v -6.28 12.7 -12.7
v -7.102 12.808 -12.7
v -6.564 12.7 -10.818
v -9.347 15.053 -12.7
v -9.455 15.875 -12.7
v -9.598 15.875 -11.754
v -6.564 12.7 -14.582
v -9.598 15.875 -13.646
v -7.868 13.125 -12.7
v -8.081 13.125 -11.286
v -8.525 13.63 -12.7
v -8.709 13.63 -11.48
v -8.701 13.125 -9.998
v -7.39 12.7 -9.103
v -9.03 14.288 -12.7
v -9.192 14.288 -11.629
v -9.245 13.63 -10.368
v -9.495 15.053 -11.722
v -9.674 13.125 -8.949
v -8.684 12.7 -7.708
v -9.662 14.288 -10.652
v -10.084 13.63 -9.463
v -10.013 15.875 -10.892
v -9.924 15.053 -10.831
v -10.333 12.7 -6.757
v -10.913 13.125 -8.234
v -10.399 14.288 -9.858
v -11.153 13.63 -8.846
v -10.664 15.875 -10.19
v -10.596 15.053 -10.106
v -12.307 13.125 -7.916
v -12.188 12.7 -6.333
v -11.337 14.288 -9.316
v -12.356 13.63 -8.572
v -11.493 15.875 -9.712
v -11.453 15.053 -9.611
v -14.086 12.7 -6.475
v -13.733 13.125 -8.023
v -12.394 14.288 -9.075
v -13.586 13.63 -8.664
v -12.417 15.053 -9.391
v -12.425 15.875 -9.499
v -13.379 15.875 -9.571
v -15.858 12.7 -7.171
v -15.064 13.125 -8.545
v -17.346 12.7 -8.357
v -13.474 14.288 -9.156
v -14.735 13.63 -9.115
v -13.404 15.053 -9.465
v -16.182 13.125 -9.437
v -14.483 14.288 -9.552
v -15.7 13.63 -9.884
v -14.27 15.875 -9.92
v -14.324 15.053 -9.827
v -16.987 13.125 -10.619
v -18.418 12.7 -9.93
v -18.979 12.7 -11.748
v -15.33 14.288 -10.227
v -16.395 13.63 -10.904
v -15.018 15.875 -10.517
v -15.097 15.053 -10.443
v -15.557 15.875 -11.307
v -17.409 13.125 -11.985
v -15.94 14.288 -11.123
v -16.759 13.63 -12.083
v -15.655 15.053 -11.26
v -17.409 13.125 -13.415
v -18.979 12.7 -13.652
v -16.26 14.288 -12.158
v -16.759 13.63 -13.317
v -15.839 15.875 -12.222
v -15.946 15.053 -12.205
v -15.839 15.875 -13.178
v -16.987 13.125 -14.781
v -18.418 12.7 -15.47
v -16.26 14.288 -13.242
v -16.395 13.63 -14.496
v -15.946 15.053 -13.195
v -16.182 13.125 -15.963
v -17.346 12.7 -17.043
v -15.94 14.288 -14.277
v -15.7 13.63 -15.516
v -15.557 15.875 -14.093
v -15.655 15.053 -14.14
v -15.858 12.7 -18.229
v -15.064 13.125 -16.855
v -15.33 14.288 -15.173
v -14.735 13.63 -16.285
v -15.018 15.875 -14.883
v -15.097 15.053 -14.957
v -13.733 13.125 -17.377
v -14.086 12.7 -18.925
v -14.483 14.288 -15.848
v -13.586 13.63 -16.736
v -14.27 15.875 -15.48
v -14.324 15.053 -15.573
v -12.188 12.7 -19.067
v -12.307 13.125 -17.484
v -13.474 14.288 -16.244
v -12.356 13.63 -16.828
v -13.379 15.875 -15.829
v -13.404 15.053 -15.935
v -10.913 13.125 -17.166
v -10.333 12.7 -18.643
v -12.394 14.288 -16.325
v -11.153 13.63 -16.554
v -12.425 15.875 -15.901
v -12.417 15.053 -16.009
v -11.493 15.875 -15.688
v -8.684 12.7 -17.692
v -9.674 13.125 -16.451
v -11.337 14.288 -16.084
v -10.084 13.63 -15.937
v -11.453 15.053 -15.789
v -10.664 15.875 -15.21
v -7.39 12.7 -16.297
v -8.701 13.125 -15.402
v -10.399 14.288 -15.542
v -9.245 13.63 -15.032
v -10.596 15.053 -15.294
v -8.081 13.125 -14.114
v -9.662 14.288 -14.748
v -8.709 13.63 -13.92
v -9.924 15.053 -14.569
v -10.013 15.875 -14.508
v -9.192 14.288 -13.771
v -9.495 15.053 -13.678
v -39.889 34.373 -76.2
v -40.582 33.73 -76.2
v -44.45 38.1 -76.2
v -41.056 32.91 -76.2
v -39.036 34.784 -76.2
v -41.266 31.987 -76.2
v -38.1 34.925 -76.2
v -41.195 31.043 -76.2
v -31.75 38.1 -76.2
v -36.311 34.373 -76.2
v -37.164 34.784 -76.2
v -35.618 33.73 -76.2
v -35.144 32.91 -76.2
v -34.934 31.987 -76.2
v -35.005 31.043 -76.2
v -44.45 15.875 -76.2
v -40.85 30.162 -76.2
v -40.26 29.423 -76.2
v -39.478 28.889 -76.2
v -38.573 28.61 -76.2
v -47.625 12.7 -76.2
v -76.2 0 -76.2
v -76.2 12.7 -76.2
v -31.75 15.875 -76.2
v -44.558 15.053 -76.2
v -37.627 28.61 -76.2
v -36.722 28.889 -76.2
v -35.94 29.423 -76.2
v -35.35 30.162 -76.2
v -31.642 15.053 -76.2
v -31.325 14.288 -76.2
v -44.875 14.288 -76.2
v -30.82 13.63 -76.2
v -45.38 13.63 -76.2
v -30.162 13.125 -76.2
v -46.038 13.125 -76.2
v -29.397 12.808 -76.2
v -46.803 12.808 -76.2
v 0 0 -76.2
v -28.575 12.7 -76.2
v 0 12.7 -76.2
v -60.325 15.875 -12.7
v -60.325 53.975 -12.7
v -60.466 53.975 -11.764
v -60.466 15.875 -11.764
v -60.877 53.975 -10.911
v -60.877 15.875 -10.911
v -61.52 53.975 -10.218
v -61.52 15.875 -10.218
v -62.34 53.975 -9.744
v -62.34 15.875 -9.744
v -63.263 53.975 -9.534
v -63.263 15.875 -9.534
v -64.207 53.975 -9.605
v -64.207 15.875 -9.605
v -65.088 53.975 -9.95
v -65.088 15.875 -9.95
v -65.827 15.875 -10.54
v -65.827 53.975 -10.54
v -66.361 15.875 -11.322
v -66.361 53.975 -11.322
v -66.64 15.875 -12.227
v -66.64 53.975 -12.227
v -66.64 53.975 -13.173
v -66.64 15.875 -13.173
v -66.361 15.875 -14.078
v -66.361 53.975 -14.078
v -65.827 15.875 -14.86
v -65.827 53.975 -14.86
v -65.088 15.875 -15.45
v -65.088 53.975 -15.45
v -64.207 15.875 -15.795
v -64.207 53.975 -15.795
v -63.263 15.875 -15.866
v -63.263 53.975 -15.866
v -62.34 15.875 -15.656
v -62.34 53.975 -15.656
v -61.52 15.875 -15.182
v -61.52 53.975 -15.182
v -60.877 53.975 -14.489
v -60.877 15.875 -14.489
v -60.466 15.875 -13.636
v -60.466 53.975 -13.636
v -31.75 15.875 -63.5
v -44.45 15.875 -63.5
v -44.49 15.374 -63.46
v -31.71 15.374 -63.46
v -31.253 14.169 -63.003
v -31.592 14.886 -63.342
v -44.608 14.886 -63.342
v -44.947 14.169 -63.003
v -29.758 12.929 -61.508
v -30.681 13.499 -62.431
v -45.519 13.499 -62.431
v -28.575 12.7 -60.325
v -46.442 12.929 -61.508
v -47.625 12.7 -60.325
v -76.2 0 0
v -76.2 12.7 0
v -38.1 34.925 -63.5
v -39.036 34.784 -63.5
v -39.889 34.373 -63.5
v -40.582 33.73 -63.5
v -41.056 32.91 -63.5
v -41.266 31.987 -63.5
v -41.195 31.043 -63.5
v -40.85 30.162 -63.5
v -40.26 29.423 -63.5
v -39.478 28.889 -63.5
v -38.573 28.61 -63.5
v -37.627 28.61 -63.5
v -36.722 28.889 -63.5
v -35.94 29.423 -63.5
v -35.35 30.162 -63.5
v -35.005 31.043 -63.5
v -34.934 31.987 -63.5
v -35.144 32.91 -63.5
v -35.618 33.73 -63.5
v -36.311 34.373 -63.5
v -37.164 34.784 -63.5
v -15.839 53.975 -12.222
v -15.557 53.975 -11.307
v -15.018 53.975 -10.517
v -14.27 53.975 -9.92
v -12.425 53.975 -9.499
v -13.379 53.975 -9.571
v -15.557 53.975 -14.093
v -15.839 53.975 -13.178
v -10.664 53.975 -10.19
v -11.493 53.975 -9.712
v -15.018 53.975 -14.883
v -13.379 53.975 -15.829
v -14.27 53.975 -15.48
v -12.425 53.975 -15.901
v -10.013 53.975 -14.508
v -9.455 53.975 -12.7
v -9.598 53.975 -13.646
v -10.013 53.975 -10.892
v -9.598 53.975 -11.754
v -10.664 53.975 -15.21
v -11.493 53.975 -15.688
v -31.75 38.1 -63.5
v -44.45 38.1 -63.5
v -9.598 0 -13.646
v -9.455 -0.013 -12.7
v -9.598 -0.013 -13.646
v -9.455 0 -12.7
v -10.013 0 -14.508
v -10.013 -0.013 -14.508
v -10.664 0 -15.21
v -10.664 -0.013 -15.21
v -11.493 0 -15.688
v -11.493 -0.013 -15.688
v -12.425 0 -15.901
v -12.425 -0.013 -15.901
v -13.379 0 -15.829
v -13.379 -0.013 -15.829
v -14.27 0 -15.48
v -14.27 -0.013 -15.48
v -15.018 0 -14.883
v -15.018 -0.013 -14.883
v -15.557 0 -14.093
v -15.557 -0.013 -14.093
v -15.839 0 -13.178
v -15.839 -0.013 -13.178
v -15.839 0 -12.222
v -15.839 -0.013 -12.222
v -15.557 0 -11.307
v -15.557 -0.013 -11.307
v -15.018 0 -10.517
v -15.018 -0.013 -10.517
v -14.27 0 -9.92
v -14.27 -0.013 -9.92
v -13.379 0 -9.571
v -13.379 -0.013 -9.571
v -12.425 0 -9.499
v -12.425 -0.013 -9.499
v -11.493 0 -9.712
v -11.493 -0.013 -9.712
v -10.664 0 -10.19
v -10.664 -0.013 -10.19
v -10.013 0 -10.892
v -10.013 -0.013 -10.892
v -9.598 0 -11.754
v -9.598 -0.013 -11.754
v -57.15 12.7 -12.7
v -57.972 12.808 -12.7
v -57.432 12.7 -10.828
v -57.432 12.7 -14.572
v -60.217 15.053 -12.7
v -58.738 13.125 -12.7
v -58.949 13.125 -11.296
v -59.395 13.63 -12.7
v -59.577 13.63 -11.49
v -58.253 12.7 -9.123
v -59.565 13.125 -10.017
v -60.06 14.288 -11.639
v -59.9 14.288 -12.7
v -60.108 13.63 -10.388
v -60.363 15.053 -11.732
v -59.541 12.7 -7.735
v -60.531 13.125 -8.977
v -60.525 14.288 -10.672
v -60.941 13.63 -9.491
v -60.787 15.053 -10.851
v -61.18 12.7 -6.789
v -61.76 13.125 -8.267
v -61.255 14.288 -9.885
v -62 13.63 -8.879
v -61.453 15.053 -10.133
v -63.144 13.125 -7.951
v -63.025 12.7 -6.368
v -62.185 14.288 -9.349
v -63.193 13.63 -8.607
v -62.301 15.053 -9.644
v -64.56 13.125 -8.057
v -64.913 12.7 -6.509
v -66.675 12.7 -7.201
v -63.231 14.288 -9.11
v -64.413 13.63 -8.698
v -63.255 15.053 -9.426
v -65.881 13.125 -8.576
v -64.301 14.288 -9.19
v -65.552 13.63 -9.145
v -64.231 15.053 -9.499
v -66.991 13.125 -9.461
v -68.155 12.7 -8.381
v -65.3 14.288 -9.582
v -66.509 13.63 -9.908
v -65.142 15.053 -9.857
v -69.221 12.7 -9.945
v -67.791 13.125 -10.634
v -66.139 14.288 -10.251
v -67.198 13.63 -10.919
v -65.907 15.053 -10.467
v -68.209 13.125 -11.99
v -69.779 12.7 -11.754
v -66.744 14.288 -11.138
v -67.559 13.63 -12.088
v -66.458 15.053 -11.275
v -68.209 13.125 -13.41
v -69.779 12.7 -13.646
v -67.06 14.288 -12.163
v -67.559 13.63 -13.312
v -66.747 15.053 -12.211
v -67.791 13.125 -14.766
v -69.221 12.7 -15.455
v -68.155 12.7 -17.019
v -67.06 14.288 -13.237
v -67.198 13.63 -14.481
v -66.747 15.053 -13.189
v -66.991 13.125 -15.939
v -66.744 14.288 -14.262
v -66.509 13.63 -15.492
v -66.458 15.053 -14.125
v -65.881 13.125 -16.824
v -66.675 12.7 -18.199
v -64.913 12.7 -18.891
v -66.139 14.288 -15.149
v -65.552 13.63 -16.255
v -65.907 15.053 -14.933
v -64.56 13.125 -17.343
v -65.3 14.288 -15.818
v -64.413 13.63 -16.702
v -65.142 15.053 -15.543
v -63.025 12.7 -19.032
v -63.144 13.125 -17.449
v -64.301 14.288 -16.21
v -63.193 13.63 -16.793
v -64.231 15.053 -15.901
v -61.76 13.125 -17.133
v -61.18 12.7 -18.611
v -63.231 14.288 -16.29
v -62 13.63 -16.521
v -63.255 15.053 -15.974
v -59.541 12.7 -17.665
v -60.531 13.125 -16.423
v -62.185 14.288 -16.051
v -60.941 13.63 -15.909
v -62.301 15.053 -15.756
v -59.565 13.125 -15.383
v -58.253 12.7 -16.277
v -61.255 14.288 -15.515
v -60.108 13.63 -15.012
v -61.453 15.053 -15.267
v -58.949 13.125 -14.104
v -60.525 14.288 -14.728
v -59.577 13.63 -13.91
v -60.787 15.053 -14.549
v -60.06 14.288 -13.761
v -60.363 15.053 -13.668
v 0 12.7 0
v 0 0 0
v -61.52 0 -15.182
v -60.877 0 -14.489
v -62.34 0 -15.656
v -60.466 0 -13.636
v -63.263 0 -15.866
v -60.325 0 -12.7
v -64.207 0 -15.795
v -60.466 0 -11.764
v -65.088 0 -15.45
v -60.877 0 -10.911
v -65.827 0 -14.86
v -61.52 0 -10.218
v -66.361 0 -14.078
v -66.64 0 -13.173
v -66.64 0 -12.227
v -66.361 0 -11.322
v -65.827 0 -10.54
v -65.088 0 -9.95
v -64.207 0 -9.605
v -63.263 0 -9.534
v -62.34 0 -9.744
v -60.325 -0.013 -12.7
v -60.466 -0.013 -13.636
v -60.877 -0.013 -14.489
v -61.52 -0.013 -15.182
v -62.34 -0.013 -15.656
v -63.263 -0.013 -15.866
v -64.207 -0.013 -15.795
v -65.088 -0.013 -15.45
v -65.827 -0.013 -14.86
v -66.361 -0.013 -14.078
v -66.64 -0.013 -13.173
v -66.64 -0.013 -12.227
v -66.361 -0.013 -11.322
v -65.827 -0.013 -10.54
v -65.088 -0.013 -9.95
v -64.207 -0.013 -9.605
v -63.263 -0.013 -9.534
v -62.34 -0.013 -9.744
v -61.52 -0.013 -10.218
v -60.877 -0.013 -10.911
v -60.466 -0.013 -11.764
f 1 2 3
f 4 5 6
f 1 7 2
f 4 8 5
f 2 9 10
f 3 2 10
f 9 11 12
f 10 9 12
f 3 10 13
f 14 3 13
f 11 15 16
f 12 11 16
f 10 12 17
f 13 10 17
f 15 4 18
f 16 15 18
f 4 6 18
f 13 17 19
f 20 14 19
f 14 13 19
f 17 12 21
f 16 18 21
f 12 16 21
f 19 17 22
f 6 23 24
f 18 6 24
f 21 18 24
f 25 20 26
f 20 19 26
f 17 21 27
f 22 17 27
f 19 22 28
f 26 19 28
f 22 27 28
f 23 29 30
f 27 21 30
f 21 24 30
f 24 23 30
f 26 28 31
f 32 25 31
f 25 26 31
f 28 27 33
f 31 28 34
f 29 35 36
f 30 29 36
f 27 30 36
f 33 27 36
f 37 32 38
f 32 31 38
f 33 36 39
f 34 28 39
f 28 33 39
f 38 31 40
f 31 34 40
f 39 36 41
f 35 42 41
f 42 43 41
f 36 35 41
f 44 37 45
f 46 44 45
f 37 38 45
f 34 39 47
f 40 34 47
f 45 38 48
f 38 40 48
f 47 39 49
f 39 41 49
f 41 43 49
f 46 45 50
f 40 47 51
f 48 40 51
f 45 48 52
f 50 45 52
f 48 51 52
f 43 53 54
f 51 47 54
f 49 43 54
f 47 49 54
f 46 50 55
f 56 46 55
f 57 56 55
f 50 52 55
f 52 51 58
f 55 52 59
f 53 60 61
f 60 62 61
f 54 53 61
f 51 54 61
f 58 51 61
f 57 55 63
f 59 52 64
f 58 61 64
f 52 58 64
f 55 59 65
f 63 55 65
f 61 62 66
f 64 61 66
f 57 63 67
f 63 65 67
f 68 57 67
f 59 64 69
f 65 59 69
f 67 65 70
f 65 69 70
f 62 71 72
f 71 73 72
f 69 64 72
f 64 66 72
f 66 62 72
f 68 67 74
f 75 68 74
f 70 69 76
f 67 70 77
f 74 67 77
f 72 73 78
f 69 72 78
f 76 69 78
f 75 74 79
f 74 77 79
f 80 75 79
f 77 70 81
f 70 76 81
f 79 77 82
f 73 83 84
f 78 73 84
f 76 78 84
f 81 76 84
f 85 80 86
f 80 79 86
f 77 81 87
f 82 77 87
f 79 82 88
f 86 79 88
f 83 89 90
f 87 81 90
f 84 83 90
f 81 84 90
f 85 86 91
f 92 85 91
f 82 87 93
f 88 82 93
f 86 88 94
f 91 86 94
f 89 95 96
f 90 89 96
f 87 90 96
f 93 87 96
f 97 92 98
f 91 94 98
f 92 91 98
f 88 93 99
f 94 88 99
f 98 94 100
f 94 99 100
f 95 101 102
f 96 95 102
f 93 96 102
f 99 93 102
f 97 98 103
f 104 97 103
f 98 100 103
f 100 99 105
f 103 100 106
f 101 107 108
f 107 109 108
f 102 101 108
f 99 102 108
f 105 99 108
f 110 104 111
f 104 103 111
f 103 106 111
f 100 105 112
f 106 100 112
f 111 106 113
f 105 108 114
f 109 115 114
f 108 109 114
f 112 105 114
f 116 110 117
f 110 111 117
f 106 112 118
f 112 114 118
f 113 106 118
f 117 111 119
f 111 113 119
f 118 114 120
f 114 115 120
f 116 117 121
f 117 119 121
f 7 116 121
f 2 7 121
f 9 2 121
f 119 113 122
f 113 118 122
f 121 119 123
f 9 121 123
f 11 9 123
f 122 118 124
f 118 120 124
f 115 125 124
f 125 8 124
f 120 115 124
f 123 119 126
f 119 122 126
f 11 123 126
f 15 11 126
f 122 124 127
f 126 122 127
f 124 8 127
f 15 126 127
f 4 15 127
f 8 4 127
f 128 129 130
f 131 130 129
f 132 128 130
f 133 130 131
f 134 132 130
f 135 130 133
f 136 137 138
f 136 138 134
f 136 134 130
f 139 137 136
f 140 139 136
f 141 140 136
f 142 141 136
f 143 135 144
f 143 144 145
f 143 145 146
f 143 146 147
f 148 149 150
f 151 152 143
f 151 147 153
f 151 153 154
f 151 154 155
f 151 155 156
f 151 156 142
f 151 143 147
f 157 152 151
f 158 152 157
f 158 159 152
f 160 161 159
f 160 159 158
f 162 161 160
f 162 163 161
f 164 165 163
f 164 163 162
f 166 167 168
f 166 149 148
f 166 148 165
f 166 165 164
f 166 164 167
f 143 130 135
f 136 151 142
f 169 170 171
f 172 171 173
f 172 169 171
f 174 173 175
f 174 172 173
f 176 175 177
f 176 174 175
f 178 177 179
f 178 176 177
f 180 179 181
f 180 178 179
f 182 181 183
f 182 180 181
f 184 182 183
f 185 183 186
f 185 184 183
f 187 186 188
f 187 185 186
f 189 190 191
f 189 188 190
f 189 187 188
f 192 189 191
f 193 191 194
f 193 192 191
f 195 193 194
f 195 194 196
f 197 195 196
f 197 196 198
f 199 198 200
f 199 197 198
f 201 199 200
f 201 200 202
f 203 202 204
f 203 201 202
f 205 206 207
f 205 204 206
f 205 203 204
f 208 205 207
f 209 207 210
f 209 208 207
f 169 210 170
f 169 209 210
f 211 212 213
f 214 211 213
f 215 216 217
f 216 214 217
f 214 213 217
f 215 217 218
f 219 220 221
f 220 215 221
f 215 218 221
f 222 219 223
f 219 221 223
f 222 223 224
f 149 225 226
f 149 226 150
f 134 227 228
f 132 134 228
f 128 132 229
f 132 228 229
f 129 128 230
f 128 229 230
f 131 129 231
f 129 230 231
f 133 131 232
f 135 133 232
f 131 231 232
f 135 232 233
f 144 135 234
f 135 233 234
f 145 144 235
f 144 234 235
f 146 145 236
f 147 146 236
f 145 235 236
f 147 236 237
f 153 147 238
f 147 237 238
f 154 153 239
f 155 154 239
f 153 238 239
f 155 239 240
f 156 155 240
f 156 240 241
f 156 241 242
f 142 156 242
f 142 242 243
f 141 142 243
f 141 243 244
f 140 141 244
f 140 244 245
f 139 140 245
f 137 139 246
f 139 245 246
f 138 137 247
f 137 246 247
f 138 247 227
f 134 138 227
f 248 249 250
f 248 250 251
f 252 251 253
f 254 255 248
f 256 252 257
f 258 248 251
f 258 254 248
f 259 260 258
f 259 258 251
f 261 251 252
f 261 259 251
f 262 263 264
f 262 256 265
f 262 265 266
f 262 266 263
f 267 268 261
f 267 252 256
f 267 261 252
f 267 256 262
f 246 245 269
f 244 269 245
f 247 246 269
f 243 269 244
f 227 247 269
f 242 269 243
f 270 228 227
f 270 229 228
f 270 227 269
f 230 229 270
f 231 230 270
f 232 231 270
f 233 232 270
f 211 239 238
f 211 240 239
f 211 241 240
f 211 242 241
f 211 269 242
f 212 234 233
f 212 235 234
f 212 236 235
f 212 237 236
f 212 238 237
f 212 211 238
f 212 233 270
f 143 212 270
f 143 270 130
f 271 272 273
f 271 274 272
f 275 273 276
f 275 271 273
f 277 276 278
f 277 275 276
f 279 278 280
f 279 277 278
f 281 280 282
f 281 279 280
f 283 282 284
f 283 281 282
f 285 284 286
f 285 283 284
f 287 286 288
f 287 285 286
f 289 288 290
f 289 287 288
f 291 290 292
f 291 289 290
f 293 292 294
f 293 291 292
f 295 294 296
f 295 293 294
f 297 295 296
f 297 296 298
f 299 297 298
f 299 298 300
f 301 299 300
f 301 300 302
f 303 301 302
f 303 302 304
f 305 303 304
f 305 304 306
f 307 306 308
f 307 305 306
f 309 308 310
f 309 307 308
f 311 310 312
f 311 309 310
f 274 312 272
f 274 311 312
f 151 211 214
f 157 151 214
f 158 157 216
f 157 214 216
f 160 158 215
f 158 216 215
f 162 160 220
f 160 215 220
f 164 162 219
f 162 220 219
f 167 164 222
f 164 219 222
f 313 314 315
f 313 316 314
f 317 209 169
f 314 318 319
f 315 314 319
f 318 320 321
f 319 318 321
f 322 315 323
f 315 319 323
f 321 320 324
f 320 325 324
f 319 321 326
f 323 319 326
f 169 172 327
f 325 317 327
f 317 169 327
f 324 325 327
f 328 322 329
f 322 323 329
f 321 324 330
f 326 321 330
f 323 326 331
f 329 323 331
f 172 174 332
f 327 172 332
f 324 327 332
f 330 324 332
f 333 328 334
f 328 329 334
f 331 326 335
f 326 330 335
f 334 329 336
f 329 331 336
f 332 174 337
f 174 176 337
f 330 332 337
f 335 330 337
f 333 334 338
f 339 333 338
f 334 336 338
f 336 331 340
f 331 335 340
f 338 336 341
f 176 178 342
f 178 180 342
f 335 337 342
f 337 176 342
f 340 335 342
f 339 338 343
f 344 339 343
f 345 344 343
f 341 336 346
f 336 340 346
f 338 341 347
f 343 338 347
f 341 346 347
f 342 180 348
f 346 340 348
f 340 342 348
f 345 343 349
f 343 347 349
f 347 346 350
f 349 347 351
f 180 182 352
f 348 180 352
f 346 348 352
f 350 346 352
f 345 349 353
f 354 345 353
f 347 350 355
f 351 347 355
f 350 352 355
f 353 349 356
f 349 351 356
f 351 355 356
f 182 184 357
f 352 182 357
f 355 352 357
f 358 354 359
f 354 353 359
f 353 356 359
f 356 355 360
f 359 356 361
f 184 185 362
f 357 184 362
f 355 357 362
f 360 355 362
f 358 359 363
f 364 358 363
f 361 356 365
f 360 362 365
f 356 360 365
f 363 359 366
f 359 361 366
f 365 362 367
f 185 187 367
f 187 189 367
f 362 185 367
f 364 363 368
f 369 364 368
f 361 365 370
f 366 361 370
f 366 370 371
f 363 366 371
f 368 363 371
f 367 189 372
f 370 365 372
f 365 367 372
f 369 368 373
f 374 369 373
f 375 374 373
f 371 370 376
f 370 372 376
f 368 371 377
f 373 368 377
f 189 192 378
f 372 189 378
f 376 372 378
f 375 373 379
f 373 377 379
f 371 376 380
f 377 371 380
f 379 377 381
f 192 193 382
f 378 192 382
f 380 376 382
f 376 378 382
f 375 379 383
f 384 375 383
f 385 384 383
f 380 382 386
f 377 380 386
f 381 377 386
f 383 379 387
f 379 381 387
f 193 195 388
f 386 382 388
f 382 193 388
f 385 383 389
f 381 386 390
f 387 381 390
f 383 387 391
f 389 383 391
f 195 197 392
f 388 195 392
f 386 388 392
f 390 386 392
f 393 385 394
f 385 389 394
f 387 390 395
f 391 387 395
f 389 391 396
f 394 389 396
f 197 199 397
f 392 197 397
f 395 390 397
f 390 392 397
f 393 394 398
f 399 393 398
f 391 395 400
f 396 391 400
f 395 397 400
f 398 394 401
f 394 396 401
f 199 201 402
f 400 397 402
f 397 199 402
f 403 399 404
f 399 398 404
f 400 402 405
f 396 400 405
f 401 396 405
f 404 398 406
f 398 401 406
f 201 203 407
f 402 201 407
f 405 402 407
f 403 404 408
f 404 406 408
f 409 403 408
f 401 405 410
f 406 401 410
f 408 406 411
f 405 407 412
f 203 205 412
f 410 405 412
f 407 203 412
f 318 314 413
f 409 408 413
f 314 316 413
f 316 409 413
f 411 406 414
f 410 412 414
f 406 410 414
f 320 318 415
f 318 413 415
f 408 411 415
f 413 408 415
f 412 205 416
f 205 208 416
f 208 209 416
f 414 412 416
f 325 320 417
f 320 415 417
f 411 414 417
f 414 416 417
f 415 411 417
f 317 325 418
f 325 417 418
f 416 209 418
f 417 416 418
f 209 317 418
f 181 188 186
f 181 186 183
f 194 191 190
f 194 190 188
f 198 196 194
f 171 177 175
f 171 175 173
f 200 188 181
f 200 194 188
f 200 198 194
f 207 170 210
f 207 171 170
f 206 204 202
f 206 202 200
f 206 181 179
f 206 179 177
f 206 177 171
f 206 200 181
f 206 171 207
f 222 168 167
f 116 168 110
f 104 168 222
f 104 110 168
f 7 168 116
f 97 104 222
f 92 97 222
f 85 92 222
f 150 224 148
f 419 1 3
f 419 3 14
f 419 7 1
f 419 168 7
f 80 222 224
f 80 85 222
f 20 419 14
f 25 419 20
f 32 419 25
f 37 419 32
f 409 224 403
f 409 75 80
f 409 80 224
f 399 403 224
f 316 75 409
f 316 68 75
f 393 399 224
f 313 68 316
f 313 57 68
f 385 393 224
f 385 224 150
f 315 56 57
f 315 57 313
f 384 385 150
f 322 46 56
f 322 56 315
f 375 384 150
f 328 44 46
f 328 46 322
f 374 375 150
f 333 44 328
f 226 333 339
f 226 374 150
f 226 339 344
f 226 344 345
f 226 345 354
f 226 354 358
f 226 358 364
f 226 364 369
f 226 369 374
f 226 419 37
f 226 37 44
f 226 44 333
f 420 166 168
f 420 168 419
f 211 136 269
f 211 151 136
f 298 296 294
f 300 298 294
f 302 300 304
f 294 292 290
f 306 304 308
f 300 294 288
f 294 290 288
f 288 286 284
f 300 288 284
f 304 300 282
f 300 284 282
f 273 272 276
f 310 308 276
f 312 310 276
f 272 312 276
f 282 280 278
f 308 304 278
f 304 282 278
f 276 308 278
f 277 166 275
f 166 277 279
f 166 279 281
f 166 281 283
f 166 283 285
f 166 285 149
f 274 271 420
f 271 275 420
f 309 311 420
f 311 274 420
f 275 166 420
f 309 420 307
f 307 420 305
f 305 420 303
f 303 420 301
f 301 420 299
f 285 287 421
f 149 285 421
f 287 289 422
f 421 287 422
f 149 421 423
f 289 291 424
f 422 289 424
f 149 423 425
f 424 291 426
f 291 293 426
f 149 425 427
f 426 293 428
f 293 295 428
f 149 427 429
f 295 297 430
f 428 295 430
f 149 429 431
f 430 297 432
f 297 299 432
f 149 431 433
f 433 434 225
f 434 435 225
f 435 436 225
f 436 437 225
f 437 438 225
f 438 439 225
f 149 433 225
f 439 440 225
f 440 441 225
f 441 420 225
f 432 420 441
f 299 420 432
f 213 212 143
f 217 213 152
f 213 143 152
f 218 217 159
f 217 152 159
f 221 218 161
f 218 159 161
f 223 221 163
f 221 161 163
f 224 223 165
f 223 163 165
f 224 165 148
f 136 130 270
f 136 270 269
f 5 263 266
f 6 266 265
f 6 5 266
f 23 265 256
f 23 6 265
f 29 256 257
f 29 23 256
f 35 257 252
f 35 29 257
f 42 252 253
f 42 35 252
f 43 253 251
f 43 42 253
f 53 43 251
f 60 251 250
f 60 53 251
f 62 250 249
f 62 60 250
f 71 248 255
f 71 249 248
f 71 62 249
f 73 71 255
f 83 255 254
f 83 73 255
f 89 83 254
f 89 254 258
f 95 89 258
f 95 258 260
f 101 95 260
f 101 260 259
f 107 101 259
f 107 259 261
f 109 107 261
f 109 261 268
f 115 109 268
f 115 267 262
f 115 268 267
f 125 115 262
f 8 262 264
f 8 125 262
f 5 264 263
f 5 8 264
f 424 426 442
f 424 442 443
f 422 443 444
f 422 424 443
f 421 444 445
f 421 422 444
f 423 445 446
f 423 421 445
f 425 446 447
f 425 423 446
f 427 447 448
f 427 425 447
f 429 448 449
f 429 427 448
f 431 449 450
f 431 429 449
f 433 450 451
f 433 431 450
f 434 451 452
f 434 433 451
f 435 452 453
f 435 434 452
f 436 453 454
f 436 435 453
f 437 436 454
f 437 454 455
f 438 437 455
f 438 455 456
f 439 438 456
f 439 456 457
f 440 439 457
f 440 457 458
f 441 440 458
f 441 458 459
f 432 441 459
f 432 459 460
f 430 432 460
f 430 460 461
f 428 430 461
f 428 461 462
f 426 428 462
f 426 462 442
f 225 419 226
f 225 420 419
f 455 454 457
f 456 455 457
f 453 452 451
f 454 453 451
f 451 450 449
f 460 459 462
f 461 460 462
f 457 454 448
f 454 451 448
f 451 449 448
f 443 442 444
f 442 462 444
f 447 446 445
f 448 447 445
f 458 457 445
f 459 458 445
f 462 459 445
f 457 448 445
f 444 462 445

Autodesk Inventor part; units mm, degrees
ref_plane "YZ Plane" through (0, 0, 0) normal (1, 0, 0) x (0, 1, 0)
ref_plane "XZ Plane" through (0, 0, 0) normal (0, 1, 0) x (-1, 0, 0)
ref_plane "XY Plane" through (0, 0, 0) normal (0, 0, 1) x (1, 0, 0)
sketch "Sketch1" plane through (0, 0, 0) normal (0, 1, 0) x (-1, 0, 0)
  line L0 (0, 0) -> (76.2, 0)
  line L1 (76.2, 0) -> (76.2, -76.2)
  line L2 (76.2, -76.2) -> (0, -76.2)
  line L3 (0, -76.2) -> (0, 0)
  dimension "d0" = 76.2
  dimension "d1" = 76.2
extrude "Extrusion1" add sketch "Sketch1" along normal blind 12.7
sketch "Sketch2" plane through (0, 12.7, 0) normal (0, 1, 0) x (1, 0, 0)
  point P0 (0, 0)
  point P1 (-12.7, 12.7)
  point P2 (-63.5, 12.7)
hole "Hole1" at (-12.7, 12.7, -12.7) at (-63.5, 12.7, -12.7) direction (0, -1, 0) diameter 5.08 depth 9.525 tip angle 118
sketch "Sketch3" plane through (0, 12.7, 0) normal (0, 1, 0) x (1, 0, 0)
  line L0 (0, 76.2) -> (-76.2, 76.2) projected
  line L1 (-44.45, 76.2) -> (-31.75, 76.2)
  line L2 (-31.75, 76.2) -> (-31.75, 63.5)
  line L3 (-31.75, 63.5) -> (-44.45, 63.5)
  line L4 (-44.45, 63.5) -> (-44.45, 76.2)
  point P0 (0, 0)
  point P1 (-38.1, 76.2)
  dimension "d11" = 12.7
  dimension "d12" = 12.7
extrude "Extrusion2" add sketch "Sketch3" along normal blind 25.4
sketch "Sketch4" plane through (0, 0, -76.2) normal (0, 0, -1) x (-1, 0, 0)
  point P0 (0, 0)
  point P1 (38.1, 31.75)
hole "Hole2" at (-38.1, 31.75, -76.2) direction (0, 0, 1) diameter 6.35 depth 14.2875 tip angle 118
fillet "Fillet1" radius 3.175 3 edges at (-31.75, 12.7, -69.85) (-38.1, 12.7, -63.5) (-44.45, 12.7, -69.85)
sketch "Sketch5" plane through (0, 12.7, 0) normal (0, 1, 0) x (1, 0, 0)
  circle A0 centre (-63.5, 12.7) radius 2.54 projected
  point P0 (0, 0)
  point P1 (-12.7, 12.7)
hole "Hole3" at (-63.5, 12.7, -12.7) at (-12.7, 12.7, -12.7) direction (0, -1, 0) diameter 6.35 depth 9.525 tip angle 118
sketch "Sketch6" plane through (0, 12.7, 0) normal (0, 1, 0) x (1, 0, 0)
  circle A0 centre (-63.5, 12.7) radius 3.175 projected
  circle A1 centre (-12.6652, 12.7) radius 3.2098
  circle A2 centre (-63.5, 12.7) radius 3.175
  point P0 (0, 0)
extrude "Extrusion3" add sketch "Sketch6" along normal blind 41.275 and the other way blind 12.7127
fillet "Fillet2" radius 3.175 1 edges at (-15.875, 12.7, -12.7)
fillet "Fillet3" radius 3.175 1 edges at (-66.675, 12.7, -12.7)
properties part number "Cupholder"
